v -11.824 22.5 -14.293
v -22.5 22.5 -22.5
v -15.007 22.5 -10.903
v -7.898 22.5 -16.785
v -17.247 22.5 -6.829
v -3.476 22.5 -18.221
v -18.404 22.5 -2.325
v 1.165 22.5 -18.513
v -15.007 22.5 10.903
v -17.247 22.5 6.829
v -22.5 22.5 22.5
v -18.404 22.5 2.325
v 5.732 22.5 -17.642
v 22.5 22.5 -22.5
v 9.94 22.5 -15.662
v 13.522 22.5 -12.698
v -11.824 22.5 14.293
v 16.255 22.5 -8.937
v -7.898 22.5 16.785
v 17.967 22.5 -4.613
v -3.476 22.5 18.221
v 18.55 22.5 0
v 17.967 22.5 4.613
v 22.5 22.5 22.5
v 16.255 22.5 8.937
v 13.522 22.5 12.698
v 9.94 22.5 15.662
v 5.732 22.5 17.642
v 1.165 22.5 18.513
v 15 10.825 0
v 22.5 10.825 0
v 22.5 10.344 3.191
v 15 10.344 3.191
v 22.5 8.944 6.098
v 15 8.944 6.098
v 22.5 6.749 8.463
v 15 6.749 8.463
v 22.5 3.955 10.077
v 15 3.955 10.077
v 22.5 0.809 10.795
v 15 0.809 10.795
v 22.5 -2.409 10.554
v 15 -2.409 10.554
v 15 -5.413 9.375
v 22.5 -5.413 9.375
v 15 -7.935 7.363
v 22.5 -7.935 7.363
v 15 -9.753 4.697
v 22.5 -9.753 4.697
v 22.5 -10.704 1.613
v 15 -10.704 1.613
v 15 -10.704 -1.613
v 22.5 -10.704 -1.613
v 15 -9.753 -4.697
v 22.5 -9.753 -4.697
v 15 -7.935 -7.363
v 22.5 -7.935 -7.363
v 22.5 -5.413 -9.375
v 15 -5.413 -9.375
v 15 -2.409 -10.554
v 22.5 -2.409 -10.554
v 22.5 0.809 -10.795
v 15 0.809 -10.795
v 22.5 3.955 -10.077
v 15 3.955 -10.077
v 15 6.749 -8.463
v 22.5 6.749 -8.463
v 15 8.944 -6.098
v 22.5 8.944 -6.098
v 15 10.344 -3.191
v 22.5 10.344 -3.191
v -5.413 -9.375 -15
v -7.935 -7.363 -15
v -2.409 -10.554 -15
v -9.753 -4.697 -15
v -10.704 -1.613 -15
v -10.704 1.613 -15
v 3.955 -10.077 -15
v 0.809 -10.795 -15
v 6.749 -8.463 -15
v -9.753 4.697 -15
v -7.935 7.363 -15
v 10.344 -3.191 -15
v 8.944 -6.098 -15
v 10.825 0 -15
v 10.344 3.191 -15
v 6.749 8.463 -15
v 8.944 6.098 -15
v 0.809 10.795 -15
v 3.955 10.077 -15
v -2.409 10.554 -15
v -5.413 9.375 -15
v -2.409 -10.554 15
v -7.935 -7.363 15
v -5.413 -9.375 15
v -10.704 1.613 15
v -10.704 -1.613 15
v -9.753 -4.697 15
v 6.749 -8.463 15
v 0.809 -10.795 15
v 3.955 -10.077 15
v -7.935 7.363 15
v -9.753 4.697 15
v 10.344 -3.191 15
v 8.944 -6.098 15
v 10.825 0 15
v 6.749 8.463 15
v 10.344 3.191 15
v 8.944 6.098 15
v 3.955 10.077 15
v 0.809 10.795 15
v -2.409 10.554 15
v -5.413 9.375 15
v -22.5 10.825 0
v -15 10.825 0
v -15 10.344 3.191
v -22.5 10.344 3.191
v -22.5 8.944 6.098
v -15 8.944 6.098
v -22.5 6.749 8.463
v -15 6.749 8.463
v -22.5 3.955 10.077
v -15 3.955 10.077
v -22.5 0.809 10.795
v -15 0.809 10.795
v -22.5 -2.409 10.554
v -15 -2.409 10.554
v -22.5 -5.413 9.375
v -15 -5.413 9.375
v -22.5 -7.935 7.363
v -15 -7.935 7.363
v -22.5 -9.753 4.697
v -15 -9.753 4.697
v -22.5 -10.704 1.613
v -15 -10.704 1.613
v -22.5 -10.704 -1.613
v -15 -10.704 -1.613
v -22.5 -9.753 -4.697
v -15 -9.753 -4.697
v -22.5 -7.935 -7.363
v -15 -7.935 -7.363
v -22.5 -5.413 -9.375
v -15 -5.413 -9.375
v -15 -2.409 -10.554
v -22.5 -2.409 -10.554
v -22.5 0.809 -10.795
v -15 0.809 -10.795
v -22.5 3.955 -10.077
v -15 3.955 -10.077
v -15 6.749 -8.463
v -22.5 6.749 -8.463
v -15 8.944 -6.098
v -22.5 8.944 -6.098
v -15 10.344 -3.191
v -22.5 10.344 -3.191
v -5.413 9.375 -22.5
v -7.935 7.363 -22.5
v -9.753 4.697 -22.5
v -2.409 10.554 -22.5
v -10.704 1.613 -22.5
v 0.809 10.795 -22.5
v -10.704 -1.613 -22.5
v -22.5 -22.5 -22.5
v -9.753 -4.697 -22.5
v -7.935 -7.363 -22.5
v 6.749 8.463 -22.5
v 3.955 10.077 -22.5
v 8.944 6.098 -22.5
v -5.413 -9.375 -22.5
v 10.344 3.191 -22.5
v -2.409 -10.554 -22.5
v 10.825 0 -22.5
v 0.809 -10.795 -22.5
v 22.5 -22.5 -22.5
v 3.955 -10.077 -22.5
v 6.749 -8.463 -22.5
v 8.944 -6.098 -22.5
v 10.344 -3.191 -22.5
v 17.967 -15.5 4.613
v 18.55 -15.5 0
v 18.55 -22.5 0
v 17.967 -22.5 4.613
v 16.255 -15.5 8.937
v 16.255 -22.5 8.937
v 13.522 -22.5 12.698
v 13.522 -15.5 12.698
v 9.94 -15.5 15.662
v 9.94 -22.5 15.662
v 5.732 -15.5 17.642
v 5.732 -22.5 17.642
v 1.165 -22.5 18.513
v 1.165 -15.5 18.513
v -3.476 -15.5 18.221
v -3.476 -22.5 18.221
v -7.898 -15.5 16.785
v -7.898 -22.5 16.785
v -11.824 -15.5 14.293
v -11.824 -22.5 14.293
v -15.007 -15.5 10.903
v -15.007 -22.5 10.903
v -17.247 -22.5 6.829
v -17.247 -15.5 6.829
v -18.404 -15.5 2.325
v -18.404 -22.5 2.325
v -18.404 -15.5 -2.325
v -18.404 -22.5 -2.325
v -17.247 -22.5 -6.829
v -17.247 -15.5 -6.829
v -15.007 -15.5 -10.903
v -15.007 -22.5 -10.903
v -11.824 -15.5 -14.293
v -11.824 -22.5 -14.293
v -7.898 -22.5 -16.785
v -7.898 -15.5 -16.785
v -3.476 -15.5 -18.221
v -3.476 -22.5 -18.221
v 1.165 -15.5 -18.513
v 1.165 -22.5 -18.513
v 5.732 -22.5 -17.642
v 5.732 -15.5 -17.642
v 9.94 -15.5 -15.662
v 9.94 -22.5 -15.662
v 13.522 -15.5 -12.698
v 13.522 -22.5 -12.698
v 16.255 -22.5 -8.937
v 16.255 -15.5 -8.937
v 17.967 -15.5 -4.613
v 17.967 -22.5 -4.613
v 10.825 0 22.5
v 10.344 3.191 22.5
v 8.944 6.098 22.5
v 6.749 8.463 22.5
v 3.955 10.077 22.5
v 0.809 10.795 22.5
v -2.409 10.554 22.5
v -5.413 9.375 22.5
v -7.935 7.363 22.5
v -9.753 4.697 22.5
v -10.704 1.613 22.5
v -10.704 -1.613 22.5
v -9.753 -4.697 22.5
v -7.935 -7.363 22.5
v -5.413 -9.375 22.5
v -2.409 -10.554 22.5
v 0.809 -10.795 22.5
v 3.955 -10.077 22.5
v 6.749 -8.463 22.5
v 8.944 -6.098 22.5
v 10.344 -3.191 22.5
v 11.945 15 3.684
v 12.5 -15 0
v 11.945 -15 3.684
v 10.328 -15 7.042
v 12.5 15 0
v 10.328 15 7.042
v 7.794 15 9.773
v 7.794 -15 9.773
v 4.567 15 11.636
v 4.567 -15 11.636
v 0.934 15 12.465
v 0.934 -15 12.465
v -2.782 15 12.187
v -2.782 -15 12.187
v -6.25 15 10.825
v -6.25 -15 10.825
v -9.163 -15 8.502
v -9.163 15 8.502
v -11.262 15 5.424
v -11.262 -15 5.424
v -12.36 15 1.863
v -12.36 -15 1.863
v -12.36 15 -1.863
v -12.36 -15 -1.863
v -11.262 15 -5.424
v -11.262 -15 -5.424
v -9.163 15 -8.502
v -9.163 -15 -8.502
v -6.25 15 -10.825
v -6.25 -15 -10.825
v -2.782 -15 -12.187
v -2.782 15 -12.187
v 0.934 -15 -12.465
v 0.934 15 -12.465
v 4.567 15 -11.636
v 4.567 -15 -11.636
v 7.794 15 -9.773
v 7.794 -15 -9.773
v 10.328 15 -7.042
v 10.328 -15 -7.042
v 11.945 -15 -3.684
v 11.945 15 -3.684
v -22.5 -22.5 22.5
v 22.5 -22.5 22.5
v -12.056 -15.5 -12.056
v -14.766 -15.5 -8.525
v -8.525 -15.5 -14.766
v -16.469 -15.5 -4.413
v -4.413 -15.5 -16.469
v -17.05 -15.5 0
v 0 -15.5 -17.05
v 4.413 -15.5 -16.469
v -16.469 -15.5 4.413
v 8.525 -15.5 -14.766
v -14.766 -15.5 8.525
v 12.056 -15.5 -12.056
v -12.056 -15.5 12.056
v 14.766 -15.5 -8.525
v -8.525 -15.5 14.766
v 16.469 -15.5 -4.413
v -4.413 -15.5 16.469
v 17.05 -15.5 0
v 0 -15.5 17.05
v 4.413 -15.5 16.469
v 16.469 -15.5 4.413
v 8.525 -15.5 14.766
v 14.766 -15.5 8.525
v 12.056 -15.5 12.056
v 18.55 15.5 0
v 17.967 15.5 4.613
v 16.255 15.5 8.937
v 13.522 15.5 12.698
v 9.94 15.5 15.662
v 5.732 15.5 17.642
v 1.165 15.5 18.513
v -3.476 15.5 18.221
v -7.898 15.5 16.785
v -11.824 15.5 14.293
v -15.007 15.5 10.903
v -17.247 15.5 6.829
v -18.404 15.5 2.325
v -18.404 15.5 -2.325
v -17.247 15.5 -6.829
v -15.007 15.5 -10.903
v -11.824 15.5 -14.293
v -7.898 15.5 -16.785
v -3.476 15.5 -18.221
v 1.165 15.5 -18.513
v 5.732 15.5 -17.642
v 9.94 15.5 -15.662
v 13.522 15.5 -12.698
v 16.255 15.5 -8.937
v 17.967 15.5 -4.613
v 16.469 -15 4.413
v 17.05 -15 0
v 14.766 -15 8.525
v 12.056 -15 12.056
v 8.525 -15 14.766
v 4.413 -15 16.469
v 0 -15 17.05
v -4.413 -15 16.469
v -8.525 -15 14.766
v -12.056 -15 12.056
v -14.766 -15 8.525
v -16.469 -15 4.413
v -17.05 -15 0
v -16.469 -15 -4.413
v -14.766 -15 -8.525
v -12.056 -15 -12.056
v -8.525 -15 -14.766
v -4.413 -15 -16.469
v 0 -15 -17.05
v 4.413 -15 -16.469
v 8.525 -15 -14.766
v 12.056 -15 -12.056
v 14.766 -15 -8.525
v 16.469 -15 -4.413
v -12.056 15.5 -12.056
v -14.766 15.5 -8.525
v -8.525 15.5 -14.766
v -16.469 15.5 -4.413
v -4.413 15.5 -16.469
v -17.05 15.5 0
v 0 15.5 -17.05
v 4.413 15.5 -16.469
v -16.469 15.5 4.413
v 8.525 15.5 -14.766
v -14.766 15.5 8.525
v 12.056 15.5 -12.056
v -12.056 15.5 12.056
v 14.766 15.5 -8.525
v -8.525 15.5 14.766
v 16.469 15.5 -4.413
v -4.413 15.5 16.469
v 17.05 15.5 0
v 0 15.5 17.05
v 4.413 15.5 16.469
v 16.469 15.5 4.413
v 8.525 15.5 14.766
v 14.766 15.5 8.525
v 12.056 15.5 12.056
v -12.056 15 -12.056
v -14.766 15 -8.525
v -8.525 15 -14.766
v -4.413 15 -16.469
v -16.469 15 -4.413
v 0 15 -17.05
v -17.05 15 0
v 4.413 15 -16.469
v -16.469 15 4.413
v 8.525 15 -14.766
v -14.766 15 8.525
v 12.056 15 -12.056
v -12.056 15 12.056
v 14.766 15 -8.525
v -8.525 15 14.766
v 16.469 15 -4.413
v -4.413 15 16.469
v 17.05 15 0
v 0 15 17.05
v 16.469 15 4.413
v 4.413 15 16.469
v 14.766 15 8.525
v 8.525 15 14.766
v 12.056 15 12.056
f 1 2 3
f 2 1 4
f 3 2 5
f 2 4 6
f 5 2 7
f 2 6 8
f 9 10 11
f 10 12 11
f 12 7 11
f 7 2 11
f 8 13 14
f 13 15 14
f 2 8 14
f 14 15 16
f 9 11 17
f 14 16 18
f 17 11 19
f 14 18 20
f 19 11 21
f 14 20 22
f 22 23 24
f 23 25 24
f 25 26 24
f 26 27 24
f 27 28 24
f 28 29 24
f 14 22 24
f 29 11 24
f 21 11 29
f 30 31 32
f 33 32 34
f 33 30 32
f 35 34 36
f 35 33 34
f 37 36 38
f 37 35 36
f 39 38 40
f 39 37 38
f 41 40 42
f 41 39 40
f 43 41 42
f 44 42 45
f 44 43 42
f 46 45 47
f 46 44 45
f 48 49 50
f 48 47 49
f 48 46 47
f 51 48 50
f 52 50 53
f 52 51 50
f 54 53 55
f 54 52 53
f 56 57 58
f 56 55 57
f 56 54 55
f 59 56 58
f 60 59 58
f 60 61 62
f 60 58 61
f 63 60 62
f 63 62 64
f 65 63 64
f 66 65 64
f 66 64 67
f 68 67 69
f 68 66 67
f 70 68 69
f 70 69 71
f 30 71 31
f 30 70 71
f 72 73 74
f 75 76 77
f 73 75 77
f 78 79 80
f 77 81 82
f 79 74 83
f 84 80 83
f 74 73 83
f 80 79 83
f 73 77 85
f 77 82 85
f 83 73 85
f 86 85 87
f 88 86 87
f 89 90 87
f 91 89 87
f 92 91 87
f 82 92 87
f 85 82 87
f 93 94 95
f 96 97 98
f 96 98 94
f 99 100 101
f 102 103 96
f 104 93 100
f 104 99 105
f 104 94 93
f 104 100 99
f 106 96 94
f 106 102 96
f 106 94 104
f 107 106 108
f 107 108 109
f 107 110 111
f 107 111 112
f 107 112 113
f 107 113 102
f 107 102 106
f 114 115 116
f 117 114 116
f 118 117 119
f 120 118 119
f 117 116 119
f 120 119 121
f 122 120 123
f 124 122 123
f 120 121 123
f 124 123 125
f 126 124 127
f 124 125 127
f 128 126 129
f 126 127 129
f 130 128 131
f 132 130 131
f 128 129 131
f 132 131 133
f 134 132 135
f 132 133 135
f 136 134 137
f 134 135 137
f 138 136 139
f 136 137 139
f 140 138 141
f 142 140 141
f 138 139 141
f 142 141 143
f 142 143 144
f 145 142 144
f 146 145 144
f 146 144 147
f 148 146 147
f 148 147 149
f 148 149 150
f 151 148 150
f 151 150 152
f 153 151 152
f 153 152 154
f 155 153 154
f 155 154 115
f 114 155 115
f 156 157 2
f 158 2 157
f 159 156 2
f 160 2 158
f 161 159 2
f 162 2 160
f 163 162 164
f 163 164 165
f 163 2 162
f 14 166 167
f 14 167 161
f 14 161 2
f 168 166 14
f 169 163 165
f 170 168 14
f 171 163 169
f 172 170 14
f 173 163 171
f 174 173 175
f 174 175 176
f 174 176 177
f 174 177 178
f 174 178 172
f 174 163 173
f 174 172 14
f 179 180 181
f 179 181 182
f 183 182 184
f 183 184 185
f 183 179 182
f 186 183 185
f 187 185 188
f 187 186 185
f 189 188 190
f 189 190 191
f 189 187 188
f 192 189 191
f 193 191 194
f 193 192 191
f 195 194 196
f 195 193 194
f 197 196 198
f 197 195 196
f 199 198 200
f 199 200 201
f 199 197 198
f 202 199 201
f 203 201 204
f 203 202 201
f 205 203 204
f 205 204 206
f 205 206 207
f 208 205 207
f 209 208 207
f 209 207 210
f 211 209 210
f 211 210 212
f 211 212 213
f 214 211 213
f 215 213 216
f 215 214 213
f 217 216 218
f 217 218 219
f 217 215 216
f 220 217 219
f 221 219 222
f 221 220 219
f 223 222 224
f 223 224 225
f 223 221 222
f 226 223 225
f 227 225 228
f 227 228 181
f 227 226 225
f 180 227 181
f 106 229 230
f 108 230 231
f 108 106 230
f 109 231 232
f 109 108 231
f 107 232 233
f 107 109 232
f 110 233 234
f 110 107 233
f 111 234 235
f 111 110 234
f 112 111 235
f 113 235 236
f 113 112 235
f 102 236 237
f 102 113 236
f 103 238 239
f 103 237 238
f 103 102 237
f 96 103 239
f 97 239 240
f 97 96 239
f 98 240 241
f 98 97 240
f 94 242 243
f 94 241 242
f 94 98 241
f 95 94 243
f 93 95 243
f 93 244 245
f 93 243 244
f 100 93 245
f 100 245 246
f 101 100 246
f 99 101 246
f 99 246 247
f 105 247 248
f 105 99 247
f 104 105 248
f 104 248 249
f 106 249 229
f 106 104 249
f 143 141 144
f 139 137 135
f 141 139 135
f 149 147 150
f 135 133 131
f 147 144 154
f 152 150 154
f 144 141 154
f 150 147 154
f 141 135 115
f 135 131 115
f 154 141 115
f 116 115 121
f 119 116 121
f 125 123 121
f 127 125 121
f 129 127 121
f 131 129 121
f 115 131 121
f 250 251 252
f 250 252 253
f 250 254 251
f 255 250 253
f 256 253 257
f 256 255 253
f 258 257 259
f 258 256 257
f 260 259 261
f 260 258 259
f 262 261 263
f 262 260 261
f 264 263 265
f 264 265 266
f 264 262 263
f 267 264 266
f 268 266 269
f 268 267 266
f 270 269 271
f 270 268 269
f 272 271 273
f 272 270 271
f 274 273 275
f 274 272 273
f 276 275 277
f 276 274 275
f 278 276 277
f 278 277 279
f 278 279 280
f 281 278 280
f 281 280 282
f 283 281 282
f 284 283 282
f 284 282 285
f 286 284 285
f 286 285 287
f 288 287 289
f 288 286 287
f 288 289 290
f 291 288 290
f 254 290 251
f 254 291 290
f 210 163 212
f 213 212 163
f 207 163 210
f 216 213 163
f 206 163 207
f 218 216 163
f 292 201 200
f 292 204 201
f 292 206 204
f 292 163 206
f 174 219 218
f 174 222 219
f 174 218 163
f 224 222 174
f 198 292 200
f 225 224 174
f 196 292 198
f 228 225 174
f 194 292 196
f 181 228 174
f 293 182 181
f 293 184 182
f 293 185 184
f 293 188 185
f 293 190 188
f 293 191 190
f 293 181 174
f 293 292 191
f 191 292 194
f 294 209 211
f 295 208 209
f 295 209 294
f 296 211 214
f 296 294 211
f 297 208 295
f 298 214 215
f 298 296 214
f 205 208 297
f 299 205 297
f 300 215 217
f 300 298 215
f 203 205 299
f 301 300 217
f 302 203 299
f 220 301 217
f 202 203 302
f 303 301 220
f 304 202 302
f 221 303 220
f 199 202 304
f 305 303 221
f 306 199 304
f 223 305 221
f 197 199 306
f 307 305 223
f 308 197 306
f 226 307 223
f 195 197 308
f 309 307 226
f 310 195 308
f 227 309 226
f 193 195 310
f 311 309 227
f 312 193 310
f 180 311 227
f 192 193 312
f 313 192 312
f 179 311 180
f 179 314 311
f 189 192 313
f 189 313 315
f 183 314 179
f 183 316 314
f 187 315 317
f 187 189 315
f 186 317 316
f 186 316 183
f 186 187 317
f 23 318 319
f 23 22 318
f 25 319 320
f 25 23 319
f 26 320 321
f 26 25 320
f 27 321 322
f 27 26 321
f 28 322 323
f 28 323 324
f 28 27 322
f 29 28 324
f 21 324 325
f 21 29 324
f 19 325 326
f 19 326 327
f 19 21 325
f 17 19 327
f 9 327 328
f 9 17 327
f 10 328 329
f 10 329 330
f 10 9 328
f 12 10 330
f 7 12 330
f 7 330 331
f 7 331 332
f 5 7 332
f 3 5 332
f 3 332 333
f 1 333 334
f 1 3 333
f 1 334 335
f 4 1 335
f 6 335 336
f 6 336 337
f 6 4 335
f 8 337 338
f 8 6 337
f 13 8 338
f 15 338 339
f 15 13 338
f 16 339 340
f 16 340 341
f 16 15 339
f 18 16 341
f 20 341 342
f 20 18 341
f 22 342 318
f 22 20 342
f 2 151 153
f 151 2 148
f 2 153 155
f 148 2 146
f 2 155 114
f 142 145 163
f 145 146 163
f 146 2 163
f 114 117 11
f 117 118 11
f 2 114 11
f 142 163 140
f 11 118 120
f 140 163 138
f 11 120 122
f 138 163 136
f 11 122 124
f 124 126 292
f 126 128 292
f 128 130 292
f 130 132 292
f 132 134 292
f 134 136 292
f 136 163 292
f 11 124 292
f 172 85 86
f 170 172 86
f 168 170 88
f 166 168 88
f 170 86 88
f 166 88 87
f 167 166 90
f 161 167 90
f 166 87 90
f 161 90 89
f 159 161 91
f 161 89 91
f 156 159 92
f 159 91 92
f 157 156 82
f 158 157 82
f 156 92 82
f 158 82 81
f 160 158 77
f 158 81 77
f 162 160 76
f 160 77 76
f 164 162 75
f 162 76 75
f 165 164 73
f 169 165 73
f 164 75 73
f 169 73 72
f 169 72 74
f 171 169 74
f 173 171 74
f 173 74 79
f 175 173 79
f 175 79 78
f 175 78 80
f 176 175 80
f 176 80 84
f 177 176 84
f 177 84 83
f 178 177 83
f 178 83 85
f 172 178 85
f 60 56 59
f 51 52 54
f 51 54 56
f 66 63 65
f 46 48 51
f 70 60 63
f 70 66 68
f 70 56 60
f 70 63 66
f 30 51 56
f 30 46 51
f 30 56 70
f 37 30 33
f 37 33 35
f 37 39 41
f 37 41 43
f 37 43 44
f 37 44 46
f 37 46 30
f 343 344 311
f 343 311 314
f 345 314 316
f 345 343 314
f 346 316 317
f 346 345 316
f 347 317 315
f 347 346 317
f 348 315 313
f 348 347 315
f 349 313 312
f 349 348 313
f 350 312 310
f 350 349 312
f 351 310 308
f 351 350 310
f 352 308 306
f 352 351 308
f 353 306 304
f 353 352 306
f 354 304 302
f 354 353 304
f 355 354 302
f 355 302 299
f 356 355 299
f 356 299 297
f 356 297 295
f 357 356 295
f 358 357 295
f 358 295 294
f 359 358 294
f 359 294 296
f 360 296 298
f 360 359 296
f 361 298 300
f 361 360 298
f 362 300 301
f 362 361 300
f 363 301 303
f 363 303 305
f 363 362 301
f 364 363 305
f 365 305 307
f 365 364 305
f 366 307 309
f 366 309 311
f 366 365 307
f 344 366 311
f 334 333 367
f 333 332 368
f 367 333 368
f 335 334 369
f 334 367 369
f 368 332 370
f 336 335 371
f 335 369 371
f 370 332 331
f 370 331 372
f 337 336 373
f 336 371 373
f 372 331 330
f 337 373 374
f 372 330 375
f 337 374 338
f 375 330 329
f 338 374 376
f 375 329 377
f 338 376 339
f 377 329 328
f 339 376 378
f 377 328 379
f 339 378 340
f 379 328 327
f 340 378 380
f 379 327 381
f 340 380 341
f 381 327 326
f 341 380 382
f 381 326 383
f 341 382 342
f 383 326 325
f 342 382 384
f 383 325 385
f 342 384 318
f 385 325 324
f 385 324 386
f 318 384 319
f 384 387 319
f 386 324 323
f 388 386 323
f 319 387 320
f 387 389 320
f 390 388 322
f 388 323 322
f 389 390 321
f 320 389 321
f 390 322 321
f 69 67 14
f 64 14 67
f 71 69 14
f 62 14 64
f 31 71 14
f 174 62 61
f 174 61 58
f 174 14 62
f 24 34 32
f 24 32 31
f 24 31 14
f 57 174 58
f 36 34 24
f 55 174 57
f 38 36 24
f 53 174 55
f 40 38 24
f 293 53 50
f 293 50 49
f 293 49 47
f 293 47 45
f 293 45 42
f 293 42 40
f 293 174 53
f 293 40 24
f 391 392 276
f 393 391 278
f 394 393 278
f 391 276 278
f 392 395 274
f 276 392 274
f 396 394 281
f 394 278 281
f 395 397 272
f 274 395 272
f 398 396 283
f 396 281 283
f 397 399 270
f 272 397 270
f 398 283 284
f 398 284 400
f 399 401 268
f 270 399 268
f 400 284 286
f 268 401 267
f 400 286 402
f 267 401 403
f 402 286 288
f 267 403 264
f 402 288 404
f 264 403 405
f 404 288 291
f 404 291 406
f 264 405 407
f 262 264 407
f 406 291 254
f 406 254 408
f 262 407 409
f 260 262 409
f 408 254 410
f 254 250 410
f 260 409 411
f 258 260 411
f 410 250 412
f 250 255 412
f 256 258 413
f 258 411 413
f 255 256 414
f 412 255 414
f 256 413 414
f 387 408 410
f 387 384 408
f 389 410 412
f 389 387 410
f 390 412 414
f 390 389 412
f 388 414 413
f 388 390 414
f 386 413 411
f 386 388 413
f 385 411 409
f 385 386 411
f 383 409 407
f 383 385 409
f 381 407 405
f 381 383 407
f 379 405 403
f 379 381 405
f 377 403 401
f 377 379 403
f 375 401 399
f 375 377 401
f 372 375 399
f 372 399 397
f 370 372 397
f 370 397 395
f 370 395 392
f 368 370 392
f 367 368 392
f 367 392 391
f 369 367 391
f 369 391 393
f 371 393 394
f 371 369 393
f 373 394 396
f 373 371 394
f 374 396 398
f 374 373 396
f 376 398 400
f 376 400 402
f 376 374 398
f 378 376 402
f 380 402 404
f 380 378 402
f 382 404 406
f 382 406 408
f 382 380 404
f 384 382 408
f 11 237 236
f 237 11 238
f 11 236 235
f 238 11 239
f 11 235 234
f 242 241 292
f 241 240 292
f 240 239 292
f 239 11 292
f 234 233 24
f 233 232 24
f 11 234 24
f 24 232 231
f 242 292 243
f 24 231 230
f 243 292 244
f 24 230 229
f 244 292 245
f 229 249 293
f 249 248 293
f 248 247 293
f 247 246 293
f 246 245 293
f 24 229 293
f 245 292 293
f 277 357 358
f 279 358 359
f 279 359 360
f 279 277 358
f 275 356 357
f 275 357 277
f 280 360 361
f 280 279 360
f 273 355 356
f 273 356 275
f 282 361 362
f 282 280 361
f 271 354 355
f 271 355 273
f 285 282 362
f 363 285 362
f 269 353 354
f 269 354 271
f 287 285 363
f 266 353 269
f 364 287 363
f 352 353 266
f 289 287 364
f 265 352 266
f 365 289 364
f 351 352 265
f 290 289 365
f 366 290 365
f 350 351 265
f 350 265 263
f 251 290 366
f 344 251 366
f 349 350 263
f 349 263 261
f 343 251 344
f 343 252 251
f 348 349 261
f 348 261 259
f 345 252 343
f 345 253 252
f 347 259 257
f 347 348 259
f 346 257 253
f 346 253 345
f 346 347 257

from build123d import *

# Parameters (mm, degrees)
F0_W     = 45
F0_H     = 45
F0_R     = 2
F0_R_2   = 18.55
F1_DEPTH = 22.5
F0_R_3   = 17.05
F2_DEPTH = 15.5
F0_R_4   = 12.5
F4_DEPTH = 15
F5_START = -15
F3_R     = 10.825
F5_DEPTH = 30
F6_START = 15
F6_DEPTH = 30
F8_START = 15
F7_R     = 10.825
F8_DEPTH = 10
F9_START = -15
F9_DEPTH = 10


with BuildPart() as f1:
    # F0 (on Front) → F1 (new body, symmetric)
    with BuildSketch(Plane.XZ):
        Rectangle(F0_W, F0_H)
        with Locations((-17.5, -17.5)):
            Circle(F0_R, mode=Mode.SUBTRACT)
        with Locations((17.5, -17.5)):
            Circle(F0_R, mode=Mode.SUBTRACT)
        with Locations((-17.5, 17.5)):
            Circle(F0_R, mode=Mode.SUBTRACT)
        Circle(F0_R_2, mode=Mode.SUBTRACT)
        with Locations((17.5, 17.5)):
            Circle(F0_R, mode=Mode.SUBTRACT)
        with Locations((-17.5, 17.5)):
            Circle(F0_R)
        with Locations((17.5, 17.5)):
            Circle(F0_R)
        with Locations((17.5, -17.5)):
            Circle(F0_R)
        with Locations((-17.5, -17.5)):
            Circle(F0_R)
    extrude(amount=F1_DEPTH, both=True)

    # F0 (on Front) → F2 (join, symmetric)
    with BuildSketch(Plane.XZ):
        Circle(F0_R_2)
        Circle(F0_R_3, mode=Mode.SUBTRACT)
    extrude(amount=F2_DEPTH, both=True)

    # F0 (on Front) → F4 (join, symmetric)
    with BuildSketch(Plane.XZ):
        Circle(F0_R_3)
        Circle(F0_R_4, mode=Mode.SUBTRACT)
    extrude(amount=F4_DEPTH, both=True)

    # F3 (on Right) → F5 (cut)
    with BuildSketch(Plane.YZ.offset(F5_START)):
        Circle(F3_R)
    extrude(amount=-F5_DEPTH, mode=Mode.SUBTRACT)

    # F3 (on Right) → F6 (cut)
    with BuildSketch(Plane.YZ.offset(F6_START)):
        Circle(F3_R)
    extrude(amount=F6_DEPTH, mode=Mode.SUBTRACT)

    # F7 (on Top) → F8 (cut)
    with BuildSketch(Plane.XY.offset(F8_START)):
        Circle(F7_R)
    extrude(amount=F8_DEPTH, mode=Mode.SUBTRACT)

    # F7 (on Top) → F9 (cut)
    with BuildSketch(Plane.XY.offset(F9_START)):
        Circle(F7_R)
    extrude(amount=-F9_DEPTH, mode=Mode.SUBTRACT)


solid = f1.part
